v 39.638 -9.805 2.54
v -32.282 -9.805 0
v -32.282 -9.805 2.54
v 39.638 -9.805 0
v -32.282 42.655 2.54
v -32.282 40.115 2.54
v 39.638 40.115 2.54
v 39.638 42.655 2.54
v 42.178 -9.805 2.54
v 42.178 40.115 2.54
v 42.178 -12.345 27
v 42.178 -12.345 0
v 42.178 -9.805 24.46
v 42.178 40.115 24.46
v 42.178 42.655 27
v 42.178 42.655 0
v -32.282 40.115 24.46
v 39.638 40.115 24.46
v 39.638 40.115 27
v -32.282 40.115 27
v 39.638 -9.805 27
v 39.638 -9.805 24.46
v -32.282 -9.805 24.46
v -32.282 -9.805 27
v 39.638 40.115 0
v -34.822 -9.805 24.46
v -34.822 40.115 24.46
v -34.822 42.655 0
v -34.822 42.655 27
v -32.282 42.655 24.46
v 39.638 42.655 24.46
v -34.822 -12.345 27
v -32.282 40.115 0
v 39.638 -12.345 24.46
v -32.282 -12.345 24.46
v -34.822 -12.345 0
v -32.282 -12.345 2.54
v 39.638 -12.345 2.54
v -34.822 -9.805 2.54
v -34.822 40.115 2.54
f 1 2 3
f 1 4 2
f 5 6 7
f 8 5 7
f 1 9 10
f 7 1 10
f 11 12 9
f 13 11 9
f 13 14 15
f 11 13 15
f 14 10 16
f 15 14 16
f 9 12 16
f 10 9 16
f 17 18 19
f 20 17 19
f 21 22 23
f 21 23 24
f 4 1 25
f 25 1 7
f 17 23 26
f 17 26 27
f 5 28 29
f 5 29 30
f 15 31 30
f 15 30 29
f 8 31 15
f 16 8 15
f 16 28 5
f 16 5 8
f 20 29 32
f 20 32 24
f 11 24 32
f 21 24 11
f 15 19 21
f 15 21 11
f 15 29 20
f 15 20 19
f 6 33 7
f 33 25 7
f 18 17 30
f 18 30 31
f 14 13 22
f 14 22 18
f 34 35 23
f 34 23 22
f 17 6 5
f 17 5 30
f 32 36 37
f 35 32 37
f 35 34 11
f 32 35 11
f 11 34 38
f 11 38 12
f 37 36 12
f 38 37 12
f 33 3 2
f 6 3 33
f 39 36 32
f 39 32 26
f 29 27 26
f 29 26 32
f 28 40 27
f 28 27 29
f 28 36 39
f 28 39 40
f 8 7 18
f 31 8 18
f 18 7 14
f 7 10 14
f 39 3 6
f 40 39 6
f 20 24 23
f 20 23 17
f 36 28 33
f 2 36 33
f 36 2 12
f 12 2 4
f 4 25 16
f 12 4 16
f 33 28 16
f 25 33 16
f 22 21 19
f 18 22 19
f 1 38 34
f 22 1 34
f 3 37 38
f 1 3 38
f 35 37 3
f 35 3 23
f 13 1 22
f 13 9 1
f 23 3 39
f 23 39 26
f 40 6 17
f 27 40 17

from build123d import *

# Parameters (mm, degrees)
F0_W     = 77
F0_H     = 55
F1_DEPTH = 27
F2_W     = 71.92
F2_H     = 49.92
F3_DEPTH = 27
F4_W     = 49.92
F4_H     = 21.92
F5_DEPTH = 127
F6_W     = 71.92
F6_H     = 21.92
F7_DEPTH = 70.104


with BuildPart() as f1:
    # F0 (on Top) → F1 (new body)
    with BuildSketch(Plane.XY):
        with Locations((3.67788, 15.154595)):
            Rectangle(F0_W, F0_H)
    extrude(amount=F1_DEPTH)

    # F2 (on face) → F3 (cut)
    with BuildSketch(Plane.XY.offset(27)):
        with Locations((3.67788, 15.154595)):
            Rectangle(F2_W, F2_H)
    extrude(amount=-F3_DEPTH, mode=Mode.SUBTRACT)

    # F4 (on face) → F5 (cut)
    with BuildSketch(Plane.YZ.offset(42.17788)):
        with Locations((15.154595, 13.5)):
            Rectangle(F4_W, F4_H)
    extrude(amount=-F5_DEPTH, mode=Mode.SUBTRACT)

    # F6 (on face) → F7 (cut)
    with BuildSketch(Plane.XZ.offset(12.345405)):
        with Locations((3.67788, 13.5)):
            Rectangle(F6_W, F6_H)
    extrude(amount=-F7_DEPTH, mode=Mode.SUBTRACT)


solid = f1.part
